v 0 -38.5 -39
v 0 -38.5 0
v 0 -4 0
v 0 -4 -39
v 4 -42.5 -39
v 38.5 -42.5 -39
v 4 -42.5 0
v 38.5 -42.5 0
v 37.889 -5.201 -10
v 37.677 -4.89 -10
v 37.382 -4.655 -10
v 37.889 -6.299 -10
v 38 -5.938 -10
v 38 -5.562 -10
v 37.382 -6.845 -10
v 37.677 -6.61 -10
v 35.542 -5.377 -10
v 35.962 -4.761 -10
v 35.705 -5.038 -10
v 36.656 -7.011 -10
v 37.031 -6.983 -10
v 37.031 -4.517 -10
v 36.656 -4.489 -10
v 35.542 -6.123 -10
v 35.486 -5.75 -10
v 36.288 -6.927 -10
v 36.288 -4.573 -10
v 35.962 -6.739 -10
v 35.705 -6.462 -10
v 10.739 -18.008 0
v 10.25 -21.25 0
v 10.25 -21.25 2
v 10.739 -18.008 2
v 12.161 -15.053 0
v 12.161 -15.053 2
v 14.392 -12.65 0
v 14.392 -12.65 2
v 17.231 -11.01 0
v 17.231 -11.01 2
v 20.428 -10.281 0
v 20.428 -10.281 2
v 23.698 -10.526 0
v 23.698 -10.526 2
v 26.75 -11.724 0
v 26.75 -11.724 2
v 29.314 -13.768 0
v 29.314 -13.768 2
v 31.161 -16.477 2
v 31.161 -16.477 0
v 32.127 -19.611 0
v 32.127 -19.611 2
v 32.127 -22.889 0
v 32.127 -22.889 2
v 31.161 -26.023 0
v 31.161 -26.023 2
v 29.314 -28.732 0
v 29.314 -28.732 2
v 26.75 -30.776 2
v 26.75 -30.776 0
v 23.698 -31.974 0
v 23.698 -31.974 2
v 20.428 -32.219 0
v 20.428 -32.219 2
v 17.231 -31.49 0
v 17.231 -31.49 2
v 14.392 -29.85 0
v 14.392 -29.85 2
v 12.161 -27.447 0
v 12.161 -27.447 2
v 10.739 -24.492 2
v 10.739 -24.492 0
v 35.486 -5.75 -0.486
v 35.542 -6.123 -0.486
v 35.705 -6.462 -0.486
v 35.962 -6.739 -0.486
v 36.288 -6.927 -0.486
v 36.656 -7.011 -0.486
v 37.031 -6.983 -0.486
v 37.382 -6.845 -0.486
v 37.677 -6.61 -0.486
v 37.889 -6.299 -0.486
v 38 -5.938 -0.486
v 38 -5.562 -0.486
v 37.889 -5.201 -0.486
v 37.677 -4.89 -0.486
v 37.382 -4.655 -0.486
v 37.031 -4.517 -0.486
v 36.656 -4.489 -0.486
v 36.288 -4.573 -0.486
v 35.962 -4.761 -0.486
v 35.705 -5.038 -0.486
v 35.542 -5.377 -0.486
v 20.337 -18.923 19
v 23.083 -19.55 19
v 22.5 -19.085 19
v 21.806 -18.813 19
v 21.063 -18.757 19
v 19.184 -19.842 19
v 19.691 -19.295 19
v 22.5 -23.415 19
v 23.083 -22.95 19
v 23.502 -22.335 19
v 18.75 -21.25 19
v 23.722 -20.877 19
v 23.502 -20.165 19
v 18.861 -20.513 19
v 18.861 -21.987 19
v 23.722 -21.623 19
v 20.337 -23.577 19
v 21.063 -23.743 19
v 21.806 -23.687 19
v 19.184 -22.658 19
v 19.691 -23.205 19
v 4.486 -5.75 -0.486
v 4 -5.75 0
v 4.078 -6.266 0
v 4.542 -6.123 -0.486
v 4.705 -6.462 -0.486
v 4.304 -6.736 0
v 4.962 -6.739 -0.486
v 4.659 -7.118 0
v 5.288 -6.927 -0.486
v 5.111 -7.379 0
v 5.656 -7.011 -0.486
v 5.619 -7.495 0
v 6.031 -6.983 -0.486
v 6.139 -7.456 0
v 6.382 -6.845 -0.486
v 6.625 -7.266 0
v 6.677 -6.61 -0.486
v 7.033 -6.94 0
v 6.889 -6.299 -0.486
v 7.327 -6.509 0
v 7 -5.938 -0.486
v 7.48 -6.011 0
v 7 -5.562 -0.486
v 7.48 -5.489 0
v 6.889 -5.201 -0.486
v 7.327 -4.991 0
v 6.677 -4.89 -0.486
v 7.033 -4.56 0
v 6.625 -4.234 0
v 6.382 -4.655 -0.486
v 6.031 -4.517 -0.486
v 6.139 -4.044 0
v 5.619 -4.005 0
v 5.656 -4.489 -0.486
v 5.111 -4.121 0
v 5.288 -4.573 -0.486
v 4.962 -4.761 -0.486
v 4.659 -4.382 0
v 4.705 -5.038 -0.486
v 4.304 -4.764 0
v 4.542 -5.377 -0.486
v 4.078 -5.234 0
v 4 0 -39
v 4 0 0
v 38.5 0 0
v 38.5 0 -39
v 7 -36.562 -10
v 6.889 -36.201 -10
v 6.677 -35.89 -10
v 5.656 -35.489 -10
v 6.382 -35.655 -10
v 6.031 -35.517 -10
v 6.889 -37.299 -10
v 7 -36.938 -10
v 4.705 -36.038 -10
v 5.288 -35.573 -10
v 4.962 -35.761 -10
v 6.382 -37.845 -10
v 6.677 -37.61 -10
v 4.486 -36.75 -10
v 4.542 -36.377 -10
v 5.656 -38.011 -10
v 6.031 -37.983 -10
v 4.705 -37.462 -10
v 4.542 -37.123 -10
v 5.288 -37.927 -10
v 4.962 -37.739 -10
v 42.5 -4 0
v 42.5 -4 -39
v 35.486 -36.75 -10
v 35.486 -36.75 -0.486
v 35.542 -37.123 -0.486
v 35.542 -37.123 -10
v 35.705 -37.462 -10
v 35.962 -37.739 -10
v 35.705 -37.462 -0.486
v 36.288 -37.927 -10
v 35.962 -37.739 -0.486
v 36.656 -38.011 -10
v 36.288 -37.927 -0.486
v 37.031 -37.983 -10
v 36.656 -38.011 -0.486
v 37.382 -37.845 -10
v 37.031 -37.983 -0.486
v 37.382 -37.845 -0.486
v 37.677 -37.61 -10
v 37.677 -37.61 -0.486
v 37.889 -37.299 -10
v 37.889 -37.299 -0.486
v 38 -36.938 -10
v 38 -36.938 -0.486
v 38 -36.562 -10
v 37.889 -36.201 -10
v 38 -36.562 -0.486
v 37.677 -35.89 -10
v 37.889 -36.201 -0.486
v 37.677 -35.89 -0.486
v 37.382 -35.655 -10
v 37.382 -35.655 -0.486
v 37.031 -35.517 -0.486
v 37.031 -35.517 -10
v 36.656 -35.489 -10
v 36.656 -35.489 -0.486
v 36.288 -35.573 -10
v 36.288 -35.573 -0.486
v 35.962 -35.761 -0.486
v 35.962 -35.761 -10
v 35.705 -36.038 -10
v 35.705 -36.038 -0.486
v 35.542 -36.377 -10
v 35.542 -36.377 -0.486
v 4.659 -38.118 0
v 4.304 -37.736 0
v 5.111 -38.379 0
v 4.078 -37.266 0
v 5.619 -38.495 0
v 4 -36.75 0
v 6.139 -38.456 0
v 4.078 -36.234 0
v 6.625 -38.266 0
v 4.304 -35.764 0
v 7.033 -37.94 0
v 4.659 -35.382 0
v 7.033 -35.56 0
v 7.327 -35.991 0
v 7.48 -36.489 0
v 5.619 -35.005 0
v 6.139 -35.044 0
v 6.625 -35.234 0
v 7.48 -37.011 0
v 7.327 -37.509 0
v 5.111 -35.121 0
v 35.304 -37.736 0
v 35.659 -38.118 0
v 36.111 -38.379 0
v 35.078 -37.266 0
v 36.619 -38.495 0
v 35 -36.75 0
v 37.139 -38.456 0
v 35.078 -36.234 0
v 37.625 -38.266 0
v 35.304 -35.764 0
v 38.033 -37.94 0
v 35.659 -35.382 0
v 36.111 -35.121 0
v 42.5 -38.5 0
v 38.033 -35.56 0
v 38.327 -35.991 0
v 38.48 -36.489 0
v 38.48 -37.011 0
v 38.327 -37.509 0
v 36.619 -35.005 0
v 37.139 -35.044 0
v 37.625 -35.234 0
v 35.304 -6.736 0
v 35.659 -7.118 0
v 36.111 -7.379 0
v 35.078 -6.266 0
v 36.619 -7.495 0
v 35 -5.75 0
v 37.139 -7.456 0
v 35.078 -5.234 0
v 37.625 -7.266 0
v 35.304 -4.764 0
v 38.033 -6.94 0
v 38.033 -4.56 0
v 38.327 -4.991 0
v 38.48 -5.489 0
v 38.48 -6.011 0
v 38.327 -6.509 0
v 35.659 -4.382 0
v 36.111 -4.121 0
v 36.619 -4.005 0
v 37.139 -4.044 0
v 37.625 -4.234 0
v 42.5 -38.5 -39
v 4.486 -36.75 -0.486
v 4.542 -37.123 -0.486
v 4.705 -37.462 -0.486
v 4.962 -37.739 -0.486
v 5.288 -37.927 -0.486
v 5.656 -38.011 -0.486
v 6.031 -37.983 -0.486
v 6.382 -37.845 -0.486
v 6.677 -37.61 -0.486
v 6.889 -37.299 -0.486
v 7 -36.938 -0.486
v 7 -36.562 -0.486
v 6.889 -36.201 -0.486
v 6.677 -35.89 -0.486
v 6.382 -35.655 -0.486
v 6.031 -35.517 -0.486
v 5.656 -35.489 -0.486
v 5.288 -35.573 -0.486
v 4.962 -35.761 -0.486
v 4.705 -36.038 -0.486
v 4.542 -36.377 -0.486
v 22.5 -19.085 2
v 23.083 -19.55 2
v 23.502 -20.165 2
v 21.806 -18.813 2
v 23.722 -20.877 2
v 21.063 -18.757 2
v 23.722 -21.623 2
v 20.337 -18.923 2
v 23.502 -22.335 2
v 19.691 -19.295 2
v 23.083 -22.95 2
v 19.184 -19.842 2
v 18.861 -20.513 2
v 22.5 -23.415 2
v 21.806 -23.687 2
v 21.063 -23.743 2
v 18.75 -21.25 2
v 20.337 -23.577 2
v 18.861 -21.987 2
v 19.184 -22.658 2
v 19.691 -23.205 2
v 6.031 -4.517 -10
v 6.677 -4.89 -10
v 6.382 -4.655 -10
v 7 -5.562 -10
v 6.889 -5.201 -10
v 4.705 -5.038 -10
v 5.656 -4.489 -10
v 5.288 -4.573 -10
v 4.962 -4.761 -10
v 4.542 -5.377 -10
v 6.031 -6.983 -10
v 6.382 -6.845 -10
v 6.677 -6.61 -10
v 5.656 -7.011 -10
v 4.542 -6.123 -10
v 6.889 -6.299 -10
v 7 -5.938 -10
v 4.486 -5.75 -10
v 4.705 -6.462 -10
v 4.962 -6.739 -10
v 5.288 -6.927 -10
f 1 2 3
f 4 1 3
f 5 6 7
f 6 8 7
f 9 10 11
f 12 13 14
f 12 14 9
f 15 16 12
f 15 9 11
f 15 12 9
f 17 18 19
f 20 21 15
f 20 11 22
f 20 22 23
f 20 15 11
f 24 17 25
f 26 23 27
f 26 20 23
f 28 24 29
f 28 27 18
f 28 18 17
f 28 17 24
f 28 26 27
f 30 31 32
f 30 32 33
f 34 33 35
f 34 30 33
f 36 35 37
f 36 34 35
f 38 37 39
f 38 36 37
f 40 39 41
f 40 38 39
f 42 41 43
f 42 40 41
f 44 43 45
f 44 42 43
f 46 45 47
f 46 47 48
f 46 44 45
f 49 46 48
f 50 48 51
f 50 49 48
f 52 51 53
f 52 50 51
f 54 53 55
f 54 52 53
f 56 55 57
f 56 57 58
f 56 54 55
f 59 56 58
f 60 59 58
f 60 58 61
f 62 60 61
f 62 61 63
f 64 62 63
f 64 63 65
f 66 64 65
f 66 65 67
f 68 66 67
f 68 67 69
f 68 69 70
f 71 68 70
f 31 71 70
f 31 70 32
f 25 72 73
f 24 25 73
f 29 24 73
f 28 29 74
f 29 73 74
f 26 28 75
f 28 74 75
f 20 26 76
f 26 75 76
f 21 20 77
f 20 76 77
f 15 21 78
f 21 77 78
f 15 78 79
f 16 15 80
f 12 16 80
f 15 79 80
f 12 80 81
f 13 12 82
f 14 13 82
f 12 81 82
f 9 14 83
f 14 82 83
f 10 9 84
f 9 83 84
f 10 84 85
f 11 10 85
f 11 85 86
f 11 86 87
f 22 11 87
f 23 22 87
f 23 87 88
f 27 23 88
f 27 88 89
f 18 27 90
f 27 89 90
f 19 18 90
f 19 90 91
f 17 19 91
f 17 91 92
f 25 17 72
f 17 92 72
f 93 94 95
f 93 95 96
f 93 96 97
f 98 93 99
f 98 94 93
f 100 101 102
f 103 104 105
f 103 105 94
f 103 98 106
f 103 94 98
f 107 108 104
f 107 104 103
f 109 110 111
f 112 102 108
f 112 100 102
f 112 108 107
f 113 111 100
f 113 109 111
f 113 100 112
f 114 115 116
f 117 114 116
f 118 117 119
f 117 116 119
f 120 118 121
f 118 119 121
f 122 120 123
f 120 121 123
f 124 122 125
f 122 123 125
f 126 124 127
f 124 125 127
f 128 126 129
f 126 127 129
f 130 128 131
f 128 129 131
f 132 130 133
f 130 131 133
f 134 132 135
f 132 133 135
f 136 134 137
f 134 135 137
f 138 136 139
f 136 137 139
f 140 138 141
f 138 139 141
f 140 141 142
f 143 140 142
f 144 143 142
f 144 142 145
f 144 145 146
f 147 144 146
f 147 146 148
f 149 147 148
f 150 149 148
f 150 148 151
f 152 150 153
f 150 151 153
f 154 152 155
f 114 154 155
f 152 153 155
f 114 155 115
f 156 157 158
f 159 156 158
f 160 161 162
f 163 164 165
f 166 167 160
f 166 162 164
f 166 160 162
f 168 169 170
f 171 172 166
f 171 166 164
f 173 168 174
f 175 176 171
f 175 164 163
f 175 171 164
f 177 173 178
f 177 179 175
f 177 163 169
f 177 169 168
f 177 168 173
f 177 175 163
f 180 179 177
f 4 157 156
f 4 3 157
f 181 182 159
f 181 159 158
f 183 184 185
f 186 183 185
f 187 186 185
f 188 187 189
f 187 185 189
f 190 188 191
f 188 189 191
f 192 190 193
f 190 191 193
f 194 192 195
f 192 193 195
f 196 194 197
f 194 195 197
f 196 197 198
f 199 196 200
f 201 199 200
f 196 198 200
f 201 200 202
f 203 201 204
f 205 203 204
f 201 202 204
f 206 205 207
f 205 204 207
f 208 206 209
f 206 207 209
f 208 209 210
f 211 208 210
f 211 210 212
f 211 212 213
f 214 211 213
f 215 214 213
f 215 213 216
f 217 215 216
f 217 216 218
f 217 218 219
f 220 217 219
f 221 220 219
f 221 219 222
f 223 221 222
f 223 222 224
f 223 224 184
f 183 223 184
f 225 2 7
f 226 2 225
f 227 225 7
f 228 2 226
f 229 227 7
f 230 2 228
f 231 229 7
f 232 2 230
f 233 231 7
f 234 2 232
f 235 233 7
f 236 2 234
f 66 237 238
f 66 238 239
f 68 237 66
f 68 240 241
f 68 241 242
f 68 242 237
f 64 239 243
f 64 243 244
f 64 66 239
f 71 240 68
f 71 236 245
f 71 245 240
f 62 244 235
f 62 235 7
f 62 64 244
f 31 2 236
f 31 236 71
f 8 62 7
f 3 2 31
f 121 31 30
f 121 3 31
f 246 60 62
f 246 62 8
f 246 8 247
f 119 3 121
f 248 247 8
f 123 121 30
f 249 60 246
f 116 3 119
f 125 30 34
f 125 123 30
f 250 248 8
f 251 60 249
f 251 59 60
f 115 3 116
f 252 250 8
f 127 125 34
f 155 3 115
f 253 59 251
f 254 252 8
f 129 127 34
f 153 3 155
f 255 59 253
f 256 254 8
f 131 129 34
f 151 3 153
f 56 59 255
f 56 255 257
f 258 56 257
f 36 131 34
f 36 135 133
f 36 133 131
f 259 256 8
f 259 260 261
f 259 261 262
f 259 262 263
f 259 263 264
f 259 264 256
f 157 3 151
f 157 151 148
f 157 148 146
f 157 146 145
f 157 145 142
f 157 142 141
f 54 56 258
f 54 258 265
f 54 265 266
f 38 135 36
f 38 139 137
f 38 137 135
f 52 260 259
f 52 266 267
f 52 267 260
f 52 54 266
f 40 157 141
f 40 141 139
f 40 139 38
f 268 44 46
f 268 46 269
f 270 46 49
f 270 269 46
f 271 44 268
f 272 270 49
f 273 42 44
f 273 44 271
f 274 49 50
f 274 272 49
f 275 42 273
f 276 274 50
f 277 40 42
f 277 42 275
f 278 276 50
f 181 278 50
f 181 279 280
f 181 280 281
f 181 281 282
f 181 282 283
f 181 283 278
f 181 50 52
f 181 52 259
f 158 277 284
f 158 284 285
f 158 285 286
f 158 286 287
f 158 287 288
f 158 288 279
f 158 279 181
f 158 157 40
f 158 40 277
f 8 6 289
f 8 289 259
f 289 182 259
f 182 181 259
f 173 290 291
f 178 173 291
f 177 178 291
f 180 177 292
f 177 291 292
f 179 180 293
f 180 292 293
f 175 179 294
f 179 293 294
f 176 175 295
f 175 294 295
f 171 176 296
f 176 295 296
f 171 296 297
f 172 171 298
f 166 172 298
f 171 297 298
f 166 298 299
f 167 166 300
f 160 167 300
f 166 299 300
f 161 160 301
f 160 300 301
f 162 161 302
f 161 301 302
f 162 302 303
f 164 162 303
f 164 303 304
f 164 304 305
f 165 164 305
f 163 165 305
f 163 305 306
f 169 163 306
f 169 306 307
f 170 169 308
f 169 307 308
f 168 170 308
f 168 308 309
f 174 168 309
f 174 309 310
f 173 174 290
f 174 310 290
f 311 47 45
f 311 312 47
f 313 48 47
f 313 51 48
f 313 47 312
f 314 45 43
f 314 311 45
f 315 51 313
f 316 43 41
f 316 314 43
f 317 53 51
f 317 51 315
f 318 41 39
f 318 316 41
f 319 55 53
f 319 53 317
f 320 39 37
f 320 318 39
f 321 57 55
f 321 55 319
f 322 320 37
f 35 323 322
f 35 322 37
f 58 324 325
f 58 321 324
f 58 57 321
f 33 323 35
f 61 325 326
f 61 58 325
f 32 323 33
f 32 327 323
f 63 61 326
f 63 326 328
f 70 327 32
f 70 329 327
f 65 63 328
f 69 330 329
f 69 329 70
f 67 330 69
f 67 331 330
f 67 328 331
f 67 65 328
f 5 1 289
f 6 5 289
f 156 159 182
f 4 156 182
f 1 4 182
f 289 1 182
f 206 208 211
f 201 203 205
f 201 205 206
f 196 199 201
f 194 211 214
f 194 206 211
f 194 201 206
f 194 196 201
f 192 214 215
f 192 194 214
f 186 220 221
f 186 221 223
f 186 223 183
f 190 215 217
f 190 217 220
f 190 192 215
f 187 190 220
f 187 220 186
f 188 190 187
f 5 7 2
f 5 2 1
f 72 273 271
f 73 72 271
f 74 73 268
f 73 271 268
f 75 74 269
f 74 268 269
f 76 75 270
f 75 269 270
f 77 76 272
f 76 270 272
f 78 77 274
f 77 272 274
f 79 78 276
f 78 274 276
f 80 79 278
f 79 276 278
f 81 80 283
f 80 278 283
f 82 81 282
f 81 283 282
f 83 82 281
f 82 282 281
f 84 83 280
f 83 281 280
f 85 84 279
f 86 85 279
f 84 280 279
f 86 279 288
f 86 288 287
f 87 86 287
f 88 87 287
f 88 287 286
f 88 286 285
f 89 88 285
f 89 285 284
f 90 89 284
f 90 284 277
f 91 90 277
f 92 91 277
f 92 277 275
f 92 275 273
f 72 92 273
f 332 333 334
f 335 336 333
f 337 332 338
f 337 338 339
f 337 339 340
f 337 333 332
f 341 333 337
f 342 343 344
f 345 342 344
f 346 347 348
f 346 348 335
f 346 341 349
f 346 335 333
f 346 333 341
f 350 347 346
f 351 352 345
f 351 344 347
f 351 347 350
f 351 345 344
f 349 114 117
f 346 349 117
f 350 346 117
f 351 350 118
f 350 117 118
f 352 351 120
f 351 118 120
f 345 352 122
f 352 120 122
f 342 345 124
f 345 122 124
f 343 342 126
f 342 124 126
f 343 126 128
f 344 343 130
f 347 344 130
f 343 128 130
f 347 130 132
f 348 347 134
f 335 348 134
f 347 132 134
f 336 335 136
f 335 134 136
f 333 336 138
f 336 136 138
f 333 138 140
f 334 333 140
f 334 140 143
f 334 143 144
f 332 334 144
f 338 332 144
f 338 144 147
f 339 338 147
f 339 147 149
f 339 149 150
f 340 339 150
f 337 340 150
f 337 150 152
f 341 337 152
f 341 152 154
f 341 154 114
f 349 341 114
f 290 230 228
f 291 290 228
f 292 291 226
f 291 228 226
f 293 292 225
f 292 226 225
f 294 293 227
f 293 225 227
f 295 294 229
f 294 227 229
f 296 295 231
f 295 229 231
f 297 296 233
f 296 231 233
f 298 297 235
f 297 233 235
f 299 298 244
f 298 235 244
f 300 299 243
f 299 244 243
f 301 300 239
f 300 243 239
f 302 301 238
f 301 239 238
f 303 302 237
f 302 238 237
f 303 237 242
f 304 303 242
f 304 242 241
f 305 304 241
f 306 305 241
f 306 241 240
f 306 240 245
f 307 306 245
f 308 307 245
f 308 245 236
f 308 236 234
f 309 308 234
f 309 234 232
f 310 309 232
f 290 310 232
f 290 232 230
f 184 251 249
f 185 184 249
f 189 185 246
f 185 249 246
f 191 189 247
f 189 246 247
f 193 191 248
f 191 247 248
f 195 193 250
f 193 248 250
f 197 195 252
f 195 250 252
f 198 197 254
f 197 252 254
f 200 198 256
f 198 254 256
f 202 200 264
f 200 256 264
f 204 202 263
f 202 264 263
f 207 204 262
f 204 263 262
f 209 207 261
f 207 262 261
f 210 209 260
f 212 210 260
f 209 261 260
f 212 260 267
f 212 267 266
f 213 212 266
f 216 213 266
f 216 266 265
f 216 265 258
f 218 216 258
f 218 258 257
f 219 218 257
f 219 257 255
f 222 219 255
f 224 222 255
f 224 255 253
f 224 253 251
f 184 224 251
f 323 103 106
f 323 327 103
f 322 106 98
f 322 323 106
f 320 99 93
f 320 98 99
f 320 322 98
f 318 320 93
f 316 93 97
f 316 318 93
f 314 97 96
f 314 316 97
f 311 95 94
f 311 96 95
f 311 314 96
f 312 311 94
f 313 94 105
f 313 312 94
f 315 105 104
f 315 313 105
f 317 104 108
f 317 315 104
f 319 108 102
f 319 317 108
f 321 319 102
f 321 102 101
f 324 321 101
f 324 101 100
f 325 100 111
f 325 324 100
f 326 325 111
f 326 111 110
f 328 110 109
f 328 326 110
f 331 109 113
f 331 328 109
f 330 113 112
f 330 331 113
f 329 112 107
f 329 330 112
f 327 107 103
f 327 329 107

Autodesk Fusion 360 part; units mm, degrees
sketch "Sketch1" plane through (0, 0, 0) normal (0, 0, 1) x (1, 0, 0)
  line L0 (0, 0) -> (42.5, 0)
  line L1 (42.5, 0) -> (42.5, -42.5)
  line L2 (42.5, -42.5) -> (0, -42.5)
  line L3 (0, -42.5) -> (0, 0)
  dimension "d1" = 42.5
  dimension "d2" = 42.5
extrude "Extrude1" add sketch "Sketch1" against normal blind 39
sketch "Sketch2" plane through (0, 0, 0) normal (0, 0, 1) x (-1, 0, 0)
  line L0 (0, 42.5) -> (-42.5, 42.5)
  line L1 (-42.5, 42.5) -> (-42.5, 0)
  line L2 (-42.5, 0) -> (0, 0)
  line L3 (0, 0) -> (0, 42.5)
  line L4 (0, 0) -> (-42.5, 42.5)
  line L5 (-42.5, 0) -> (0, 42.5)
  line L6 (-5.75, 5.75) -> (-36.75, 5.75)
  line L7 (-36.75, 5.75) -> (-36.75, 36.75)
  line L8 (-36.75, 36.75) -> (-5.75, 36.75)
  line L9 (-5.75, 36.75) -> (-5.75, 5.75)
  circle A0 centre (-5.75, 5.75) radius 1.5
  circle A1 centre (-36.75, 5.75) radius 1.5
  circle A2 centre (-5.75, 36.75) radius 1.5
  circle A3 centre (-36.75, 36.75) radius 1.5
  dimension "d5" = 31
  dimension "d6" = 3
  dimension "d7" = 3
  dimension "d8" = 3
  dimension "d9" = 3
extrude "Extrude2" cut sketch "Sketch2" against normal blind 10 contours L5 L9 A2 | L5 L8 A2 | L4 L8 A3 | L4 L7 A3 | L4 L6 A0 | L4 L9 A0 | L5 L9 A2 | L5 L8 A2 | L5 L7 A1 | L5 L6 A1 | L4 L8 A3 | L4 L7 A3 | L4 L6 A0 | L4 L9 A0 | L5 L7 A1 | L5 L6 A1
chamfer "Chamfer1" distance 0.25 angle 45 4 edges at (7.1485, -6.2924, 0) (38.1485, -6.2924, 0) (38.1485, -37.2924, 0) (7.1485, -37.2924, 0)
thread "Thread1" "ISO Metric profile 3.0 M3x0.5 6H" major diameter 3.086 minor diameter 2.529 pitch 0.5 angle 60 resizes the face on face at (7.1322, -37.3327, -3.5) on face at (35.3678, -37.3327, -3.5) on face at (36.3437, -7.1939, -6.75) on face at (4.2575, -5.8994, -3.5)
chamfer "Chamfer2" distance 4 angle 45 4 edges at (42.5, 0, -19.5) (0, 0, -19.5) (0, -42.5, -19.5) (42.5, -42.5, -19.5)
sketch "Sketch3" plane through (0, 0, 0) normal (0, 0, 1) x (-1, 0, 0)
  circle A0 centre (-36.75, 36.75) radius 1.75
  circle A1 centre (-5.75, 5.75) radius 1.75
  line L0 (-38.5, 42.5) -> (-42.5, 38.5)
  line L1 (-42.5, 38.5) -> (-42.5, 4)
  line L2 (-42.5, 4) -> (-38.5, 0)
  line L3 (-38.5, 0) -> (-4, 0)
  line L4 (-4, 0) -> (0, 4)
  line L5 (0, 4) -> (0, 38.5)
  line L6 (0, 38.5) -> (-4, 42.5)
  line L7 (-4, 42.5) -> (-38.5, 42.5)
  circle A2 centre (-36.75, 5.75) radius 1.75
  circle A3 centre (-5.75, 36.75) radius 1.75
  line L8 (-5.75, 5.75) -> (-36.75, 36.75)
  line L9 (-36.75, 36.75) -> (-36.75, 5.75)
  line L10 (-36.75, 5.75) -> (-5.75, 36.75)
  circle A4 centre (-21.25, 21.25) radius 11
  dimension "d14" = 22
extrude "Extrude3" add sketch "Sketch3" along normal blind 2 contours L8 L10 A4 | L8 L10 A4 | L8 L10 A4 | L8 L10 A4
sketch "Sketch4" plane through (0, 0, 2) normal (0, 0, 1) x (-1, 0, 0)
  circle A0 centre (-21.25, 21.25) radius 11
  circle A1 centre (-21.25, 21.25) radius 2.5
  dimension "d17" = 5
extrude "Extrude4" add sketch "Sketch4" along normal blind 17 contours A1
